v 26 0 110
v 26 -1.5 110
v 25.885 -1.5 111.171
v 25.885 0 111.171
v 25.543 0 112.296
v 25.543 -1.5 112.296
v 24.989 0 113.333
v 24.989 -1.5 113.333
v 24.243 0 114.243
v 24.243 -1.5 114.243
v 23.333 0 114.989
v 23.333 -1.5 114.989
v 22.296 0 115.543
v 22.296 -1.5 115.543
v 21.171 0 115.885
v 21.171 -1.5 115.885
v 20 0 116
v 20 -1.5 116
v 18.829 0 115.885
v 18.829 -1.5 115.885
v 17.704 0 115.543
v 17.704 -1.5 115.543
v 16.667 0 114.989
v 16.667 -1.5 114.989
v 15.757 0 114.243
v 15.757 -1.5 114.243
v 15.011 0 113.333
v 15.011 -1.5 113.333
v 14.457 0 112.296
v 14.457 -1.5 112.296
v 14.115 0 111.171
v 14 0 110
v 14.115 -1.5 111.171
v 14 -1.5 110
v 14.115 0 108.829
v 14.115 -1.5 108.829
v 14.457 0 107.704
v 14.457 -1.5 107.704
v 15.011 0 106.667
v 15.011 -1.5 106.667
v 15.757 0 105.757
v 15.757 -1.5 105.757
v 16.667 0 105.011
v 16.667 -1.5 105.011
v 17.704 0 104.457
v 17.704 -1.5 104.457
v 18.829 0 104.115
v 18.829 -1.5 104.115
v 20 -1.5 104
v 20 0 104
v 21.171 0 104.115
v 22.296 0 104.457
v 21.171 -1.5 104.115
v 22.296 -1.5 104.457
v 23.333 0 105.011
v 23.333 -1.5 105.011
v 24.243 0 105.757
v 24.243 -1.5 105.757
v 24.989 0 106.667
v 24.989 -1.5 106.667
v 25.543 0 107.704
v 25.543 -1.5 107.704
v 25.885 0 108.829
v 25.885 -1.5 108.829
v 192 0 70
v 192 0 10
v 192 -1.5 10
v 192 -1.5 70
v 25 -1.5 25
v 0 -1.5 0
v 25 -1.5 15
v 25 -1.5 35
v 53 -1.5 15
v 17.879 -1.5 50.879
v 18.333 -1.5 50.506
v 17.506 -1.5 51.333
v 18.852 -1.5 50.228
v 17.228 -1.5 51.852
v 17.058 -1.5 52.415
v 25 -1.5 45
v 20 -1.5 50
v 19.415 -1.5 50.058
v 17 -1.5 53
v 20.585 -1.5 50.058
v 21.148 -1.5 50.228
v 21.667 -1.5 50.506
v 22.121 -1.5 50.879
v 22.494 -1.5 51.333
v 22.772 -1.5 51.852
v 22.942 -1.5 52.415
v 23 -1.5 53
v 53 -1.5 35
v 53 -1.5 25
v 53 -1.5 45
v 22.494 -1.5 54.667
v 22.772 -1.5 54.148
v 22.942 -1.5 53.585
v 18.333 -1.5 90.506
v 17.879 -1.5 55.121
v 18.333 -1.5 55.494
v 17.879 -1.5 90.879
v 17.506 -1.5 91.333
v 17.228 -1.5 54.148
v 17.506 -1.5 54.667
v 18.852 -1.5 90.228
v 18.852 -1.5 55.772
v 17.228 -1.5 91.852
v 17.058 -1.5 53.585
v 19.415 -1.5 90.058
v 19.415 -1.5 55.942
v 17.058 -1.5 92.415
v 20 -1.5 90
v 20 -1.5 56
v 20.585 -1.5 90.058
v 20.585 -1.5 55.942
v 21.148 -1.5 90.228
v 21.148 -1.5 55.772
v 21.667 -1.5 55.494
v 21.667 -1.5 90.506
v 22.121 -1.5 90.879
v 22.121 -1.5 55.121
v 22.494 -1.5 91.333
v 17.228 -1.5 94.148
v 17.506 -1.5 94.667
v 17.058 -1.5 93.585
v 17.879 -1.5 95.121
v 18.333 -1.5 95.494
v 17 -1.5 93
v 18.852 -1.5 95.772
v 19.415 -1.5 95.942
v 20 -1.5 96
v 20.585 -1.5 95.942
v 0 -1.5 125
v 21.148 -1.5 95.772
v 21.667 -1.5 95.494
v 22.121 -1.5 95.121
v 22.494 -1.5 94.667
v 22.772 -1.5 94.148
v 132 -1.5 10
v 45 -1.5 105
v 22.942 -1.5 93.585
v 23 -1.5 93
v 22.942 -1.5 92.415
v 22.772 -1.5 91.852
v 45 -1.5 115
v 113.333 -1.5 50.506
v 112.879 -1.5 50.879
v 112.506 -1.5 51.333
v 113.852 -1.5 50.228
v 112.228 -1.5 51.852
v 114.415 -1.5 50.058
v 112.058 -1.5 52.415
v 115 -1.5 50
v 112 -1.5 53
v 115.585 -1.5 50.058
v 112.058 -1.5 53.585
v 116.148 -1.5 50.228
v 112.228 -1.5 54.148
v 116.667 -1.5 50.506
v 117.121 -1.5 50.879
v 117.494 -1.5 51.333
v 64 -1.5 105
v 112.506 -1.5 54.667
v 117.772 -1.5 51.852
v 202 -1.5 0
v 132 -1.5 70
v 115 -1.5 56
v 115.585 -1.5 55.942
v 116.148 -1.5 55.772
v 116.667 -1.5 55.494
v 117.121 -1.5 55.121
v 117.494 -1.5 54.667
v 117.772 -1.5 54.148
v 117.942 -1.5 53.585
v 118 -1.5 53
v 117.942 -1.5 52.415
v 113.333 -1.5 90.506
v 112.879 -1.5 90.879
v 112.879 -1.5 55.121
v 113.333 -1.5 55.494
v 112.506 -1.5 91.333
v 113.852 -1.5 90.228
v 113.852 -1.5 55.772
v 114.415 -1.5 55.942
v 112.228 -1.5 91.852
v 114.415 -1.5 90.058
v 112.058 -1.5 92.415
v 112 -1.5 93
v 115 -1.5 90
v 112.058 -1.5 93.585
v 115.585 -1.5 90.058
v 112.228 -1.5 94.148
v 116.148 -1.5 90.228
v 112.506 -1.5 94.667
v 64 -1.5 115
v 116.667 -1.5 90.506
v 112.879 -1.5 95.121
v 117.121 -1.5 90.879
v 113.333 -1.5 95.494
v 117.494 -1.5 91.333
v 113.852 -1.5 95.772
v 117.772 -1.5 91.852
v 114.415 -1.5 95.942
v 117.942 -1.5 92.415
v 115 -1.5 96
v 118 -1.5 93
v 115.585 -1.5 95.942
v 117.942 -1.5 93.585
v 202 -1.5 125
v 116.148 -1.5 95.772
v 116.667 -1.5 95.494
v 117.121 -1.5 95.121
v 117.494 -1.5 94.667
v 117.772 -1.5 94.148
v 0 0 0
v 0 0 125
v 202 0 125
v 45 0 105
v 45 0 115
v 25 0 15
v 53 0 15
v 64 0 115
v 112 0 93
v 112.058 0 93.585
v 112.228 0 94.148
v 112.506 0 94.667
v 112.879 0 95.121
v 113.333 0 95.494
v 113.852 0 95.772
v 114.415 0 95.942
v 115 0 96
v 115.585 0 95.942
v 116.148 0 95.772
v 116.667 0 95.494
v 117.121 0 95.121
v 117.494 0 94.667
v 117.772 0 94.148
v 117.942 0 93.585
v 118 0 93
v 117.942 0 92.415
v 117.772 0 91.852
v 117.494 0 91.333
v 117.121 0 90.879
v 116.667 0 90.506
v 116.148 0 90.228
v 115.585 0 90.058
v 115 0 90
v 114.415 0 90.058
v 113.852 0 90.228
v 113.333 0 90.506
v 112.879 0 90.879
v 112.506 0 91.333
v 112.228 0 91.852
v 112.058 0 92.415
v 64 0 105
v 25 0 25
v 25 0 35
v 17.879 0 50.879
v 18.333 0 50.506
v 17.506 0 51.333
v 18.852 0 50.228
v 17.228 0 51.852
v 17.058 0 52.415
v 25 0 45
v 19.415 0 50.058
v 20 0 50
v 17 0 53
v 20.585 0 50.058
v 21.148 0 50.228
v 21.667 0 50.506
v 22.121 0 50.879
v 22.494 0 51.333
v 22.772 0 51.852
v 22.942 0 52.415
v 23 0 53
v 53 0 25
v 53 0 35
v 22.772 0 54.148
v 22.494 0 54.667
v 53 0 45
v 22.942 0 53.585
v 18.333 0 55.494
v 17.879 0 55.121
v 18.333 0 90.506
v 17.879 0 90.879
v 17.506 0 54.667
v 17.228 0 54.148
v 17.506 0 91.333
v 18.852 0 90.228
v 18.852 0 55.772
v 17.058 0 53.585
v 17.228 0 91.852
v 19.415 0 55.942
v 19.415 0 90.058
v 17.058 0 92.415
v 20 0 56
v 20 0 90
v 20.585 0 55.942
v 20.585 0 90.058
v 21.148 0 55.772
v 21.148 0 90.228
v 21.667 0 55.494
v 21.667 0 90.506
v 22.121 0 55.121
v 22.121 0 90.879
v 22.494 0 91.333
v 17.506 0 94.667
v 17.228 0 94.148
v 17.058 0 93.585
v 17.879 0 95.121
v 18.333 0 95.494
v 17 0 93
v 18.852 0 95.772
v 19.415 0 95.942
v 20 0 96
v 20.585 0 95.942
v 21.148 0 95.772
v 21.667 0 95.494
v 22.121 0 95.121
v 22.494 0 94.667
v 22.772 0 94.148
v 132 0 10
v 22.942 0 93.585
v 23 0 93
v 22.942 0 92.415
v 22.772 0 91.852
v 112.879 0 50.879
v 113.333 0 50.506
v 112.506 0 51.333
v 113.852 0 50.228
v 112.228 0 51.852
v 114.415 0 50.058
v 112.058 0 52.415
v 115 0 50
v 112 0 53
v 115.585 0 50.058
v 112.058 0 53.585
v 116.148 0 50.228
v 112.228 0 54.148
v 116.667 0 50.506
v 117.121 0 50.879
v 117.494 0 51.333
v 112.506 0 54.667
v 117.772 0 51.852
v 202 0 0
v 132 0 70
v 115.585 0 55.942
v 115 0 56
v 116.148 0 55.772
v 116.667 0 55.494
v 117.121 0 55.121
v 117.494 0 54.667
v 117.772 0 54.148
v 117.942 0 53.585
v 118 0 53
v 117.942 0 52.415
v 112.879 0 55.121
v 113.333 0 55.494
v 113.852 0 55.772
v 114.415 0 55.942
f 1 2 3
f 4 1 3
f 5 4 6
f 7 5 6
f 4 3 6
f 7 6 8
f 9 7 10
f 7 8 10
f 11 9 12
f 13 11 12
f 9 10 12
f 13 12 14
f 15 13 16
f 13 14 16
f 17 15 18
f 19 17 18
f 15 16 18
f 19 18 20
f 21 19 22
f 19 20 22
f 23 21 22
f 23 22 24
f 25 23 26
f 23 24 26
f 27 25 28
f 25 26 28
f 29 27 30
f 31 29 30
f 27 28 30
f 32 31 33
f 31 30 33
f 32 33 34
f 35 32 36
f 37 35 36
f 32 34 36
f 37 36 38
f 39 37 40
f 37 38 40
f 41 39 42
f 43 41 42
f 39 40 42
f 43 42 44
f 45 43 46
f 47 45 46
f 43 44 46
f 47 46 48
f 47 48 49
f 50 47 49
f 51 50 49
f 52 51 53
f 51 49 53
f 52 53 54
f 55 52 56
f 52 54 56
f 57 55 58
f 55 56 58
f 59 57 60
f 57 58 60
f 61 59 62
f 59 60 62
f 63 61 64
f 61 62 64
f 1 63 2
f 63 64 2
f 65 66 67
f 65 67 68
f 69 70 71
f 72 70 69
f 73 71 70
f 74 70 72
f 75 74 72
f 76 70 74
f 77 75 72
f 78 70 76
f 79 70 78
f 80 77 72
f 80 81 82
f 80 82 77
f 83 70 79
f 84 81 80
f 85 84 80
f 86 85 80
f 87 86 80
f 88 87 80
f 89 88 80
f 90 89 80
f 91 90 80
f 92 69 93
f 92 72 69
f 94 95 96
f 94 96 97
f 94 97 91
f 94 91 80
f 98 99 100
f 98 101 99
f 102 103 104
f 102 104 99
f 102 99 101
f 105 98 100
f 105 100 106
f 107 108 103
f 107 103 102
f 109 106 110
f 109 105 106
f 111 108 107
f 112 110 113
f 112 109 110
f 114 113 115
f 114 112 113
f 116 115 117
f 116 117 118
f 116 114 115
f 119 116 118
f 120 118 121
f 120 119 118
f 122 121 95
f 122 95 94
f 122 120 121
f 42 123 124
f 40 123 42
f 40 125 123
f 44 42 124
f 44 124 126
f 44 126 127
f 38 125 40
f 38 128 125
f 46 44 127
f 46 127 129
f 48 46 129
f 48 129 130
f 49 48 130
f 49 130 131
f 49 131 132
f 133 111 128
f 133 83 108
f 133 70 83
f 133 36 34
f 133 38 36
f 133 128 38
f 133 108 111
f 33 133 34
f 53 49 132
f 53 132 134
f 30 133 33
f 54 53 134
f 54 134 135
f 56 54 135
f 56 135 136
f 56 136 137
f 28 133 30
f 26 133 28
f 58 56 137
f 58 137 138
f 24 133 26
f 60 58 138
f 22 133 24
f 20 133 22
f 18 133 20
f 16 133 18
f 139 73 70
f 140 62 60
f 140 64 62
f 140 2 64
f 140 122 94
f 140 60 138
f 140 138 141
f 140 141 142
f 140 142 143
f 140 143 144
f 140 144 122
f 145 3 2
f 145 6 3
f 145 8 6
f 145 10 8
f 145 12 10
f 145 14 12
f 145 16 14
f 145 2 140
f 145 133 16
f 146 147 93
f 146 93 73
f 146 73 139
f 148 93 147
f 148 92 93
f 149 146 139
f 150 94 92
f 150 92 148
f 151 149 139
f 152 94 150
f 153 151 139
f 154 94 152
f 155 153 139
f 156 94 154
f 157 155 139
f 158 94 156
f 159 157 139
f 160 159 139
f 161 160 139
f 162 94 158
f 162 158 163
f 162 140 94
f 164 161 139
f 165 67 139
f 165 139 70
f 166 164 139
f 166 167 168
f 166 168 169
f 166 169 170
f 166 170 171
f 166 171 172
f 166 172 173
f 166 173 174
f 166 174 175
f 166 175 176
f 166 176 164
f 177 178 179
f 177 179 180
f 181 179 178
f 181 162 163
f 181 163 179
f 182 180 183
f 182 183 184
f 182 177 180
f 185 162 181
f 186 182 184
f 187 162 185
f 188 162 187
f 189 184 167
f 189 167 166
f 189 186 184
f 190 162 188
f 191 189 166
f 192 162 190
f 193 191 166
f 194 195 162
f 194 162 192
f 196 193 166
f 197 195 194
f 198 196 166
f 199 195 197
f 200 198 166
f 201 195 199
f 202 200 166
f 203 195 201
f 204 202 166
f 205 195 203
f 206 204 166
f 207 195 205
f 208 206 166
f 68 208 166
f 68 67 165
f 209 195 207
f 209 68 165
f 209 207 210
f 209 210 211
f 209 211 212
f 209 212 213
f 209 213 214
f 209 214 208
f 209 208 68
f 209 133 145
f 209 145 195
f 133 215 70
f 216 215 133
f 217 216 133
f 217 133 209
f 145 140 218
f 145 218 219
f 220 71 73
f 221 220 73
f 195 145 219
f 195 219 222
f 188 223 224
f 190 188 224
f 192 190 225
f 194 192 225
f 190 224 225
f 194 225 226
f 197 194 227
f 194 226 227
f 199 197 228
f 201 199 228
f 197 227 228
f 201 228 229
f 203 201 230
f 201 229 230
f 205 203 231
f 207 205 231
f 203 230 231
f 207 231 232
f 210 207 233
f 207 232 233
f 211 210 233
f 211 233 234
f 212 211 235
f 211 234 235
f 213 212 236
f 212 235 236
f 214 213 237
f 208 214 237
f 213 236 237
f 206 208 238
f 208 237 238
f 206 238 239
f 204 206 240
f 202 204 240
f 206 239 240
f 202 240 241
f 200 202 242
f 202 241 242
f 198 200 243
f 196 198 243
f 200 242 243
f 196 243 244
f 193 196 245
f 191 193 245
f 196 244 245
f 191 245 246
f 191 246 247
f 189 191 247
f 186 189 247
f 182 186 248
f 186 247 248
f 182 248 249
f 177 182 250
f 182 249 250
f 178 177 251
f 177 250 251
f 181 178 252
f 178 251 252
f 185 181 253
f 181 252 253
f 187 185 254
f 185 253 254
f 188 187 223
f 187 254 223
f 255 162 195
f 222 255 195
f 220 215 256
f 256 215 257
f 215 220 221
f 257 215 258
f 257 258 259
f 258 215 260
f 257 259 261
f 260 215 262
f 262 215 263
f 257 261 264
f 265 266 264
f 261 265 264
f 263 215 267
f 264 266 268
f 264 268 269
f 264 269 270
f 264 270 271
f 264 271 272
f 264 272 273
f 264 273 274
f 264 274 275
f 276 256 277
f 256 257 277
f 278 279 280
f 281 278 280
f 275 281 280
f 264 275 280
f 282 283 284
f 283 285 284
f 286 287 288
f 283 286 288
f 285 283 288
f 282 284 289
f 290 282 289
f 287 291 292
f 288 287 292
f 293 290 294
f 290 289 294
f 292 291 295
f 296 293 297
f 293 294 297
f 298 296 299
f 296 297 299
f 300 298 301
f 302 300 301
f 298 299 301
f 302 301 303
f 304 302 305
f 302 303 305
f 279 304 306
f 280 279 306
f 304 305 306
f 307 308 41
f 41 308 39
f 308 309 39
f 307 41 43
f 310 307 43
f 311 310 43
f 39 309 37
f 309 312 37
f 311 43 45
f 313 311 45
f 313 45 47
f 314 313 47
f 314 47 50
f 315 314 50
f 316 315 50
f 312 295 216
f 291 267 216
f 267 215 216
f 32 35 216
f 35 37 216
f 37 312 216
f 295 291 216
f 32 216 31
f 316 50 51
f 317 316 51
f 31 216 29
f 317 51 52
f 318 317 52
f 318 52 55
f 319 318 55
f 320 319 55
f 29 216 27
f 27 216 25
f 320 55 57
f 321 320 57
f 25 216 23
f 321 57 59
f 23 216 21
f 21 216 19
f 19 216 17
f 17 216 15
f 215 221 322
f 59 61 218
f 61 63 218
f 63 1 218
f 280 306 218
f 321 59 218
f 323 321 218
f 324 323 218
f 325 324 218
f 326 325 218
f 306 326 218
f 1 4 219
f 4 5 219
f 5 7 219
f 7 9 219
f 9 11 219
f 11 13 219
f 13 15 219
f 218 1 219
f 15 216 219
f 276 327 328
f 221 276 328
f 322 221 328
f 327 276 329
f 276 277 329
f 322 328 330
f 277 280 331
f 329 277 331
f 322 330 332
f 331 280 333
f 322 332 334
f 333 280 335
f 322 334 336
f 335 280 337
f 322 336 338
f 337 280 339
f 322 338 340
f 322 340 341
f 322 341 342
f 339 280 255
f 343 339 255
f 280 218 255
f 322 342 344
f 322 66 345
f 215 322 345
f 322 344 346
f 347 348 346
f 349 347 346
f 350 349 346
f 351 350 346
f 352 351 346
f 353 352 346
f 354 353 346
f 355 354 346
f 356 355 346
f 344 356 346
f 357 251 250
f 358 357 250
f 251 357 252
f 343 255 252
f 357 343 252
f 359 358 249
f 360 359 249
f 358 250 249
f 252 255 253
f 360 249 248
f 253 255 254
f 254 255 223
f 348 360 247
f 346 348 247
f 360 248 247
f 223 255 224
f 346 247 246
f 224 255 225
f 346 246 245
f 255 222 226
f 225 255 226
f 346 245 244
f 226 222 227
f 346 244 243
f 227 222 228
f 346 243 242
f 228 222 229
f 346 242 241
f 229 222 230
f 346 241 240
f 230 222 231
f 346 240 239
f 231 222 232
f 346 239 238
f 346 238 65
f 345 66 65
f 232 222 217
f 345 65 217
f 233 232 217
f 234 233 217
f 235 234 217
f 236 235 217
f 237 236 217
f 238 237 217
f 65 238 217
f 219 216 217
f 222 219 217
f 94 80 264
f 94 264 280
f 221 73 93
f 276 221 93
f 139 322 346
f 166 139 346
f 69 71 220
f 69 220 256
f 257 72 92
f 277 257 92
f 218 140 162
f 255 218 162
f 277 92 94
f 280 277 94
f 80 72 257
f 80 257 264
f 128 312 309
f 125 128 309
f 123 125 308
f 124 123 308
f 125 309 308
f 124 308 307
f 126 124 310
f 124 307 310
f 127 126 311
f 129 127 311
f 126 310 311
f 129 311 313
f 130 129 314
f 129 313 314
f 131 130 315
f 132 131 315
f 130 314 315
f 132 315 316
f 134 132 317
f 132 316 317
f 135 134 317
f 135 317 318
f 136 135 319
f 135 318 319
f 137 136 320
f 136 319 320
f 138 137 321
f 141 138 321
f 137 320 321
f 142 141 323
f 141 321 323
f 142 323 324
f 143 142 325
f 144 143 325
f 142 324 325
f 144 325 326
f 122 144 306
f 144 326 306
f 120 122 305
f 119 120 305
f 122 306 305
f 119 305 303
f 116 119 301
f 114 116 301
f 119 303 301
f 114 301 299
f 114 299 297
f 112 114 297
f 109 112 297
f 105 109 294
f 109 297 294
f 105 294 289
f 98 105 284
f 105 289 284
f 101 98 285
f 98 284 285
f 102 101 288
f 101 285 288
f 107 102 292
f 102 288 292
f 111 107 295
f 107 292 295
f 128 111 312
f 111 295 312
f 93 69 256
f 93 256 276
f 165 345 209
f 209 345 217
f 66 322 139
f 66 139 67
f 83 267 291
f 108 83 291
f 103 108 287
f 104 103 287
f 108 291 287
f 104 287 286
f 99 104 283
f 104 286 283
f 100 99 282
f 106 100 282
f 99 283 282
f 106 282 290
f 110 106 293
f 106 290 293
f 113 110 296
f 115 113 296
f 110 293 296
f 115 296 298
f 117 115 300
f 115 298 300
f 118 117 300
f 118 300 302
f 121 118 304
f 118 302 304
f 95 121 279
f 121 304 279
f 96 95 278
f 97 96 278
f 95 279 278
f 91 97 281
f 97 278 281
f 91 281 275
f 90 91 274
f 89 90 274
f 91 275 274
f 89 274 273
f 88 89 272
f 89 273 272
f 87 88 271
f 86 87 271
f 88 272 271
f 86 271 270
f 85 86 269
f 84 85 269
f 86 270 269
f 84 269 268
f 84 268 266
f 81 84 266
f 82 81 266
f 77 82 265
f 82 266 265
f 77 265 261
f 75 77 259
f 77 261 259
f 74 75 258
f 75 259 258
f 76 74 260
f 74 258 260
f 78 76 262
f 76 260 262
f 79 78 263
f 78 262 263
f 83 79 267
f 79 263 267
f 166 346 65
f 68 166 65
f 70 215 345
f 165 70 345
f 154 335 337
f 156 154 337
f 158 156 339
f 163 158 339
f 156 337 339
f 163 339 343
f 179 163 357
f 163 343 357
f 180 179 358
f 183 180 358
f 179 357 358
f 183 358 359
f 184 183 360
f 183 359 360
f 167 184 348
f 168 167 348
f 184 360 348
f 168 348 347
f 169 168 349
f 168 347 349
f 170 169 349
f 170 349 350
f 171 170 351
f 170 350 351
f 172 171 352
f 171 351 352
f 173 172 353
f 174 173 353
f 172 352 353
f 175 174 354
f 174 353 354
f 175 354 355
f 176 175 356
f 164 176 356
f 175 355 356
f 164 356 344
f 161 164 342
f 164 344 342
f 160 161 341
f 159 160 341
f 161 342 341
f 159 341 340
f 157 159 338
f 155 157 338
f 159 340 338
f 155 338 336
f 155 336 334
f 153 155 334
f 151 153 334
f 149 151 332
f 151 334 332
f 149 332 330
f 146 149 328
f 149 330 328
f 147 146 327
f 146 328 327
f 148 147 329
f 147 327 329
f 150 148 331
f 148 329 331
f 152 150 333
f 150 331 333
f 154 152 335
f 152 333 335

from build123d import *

# Parameters (mm, degrees)
F0_W     = 202
F0_H     = 125
F0_W_2   = 60
F0_H_2   = 60
F1_DEPTH = 1.5
F2_W     = 28
F2_H     = 10
F2_R     = 6
F2_W_2   = 19
F3_DEPTH = 1.5
F4_R     = 3
F5_DEPTH = 1.5


with BuildPart() as f1:
    # F0 (on Front) → F1 (new body)
    with BuildSketch(Plane.XZ):
        with Locations((101, 62.5)):
            Rectangle(F0_W, F0_H)
        with Locations((162, 40)):
            Rectangle(F0_W_2, F0_H_2, mode=Mode.SUBTRACT)
    extrude(amount=F1_DEPTH)

    # F2 (on face) → F3 (cut, through all)
    with BuildSketch(Plane.XZ.offset(1.5)):
        with Locations((39, 20)):
            Rectangle(F2_W, F2_H)
        with Locations((39, 40)):
            Rectangle(F2_W, F2_H)
        with Locations((20, 110)):
            Circle(F2_R)
        with Locations((54.5, 110)):
            Rectangle(F2_W_2, F2_H)
    extrude(amount=-F3_DEPTH, mode=Mode.SUBTRACT)

    # F4 (on face) → F5 (cut, through all)
    with BuildSketch(Plane(origin=(0, 0, 0), x_dir=(-1, 0, 0), z_dir=(0, 1, 0))):
        with Locations((-20, 93)):
            Circle(F4_R)
        with Locations((-115, 53)):
            Circle(F4_R)
        with Locations((-20, 53)):
            Circle(F4_R)
        with Locations((-115, 93)):
            Circle(F4_R)
    extrude(amount=-F5_DEPTH, mode=Mode.SUBTRACT)


solid = f1.part
